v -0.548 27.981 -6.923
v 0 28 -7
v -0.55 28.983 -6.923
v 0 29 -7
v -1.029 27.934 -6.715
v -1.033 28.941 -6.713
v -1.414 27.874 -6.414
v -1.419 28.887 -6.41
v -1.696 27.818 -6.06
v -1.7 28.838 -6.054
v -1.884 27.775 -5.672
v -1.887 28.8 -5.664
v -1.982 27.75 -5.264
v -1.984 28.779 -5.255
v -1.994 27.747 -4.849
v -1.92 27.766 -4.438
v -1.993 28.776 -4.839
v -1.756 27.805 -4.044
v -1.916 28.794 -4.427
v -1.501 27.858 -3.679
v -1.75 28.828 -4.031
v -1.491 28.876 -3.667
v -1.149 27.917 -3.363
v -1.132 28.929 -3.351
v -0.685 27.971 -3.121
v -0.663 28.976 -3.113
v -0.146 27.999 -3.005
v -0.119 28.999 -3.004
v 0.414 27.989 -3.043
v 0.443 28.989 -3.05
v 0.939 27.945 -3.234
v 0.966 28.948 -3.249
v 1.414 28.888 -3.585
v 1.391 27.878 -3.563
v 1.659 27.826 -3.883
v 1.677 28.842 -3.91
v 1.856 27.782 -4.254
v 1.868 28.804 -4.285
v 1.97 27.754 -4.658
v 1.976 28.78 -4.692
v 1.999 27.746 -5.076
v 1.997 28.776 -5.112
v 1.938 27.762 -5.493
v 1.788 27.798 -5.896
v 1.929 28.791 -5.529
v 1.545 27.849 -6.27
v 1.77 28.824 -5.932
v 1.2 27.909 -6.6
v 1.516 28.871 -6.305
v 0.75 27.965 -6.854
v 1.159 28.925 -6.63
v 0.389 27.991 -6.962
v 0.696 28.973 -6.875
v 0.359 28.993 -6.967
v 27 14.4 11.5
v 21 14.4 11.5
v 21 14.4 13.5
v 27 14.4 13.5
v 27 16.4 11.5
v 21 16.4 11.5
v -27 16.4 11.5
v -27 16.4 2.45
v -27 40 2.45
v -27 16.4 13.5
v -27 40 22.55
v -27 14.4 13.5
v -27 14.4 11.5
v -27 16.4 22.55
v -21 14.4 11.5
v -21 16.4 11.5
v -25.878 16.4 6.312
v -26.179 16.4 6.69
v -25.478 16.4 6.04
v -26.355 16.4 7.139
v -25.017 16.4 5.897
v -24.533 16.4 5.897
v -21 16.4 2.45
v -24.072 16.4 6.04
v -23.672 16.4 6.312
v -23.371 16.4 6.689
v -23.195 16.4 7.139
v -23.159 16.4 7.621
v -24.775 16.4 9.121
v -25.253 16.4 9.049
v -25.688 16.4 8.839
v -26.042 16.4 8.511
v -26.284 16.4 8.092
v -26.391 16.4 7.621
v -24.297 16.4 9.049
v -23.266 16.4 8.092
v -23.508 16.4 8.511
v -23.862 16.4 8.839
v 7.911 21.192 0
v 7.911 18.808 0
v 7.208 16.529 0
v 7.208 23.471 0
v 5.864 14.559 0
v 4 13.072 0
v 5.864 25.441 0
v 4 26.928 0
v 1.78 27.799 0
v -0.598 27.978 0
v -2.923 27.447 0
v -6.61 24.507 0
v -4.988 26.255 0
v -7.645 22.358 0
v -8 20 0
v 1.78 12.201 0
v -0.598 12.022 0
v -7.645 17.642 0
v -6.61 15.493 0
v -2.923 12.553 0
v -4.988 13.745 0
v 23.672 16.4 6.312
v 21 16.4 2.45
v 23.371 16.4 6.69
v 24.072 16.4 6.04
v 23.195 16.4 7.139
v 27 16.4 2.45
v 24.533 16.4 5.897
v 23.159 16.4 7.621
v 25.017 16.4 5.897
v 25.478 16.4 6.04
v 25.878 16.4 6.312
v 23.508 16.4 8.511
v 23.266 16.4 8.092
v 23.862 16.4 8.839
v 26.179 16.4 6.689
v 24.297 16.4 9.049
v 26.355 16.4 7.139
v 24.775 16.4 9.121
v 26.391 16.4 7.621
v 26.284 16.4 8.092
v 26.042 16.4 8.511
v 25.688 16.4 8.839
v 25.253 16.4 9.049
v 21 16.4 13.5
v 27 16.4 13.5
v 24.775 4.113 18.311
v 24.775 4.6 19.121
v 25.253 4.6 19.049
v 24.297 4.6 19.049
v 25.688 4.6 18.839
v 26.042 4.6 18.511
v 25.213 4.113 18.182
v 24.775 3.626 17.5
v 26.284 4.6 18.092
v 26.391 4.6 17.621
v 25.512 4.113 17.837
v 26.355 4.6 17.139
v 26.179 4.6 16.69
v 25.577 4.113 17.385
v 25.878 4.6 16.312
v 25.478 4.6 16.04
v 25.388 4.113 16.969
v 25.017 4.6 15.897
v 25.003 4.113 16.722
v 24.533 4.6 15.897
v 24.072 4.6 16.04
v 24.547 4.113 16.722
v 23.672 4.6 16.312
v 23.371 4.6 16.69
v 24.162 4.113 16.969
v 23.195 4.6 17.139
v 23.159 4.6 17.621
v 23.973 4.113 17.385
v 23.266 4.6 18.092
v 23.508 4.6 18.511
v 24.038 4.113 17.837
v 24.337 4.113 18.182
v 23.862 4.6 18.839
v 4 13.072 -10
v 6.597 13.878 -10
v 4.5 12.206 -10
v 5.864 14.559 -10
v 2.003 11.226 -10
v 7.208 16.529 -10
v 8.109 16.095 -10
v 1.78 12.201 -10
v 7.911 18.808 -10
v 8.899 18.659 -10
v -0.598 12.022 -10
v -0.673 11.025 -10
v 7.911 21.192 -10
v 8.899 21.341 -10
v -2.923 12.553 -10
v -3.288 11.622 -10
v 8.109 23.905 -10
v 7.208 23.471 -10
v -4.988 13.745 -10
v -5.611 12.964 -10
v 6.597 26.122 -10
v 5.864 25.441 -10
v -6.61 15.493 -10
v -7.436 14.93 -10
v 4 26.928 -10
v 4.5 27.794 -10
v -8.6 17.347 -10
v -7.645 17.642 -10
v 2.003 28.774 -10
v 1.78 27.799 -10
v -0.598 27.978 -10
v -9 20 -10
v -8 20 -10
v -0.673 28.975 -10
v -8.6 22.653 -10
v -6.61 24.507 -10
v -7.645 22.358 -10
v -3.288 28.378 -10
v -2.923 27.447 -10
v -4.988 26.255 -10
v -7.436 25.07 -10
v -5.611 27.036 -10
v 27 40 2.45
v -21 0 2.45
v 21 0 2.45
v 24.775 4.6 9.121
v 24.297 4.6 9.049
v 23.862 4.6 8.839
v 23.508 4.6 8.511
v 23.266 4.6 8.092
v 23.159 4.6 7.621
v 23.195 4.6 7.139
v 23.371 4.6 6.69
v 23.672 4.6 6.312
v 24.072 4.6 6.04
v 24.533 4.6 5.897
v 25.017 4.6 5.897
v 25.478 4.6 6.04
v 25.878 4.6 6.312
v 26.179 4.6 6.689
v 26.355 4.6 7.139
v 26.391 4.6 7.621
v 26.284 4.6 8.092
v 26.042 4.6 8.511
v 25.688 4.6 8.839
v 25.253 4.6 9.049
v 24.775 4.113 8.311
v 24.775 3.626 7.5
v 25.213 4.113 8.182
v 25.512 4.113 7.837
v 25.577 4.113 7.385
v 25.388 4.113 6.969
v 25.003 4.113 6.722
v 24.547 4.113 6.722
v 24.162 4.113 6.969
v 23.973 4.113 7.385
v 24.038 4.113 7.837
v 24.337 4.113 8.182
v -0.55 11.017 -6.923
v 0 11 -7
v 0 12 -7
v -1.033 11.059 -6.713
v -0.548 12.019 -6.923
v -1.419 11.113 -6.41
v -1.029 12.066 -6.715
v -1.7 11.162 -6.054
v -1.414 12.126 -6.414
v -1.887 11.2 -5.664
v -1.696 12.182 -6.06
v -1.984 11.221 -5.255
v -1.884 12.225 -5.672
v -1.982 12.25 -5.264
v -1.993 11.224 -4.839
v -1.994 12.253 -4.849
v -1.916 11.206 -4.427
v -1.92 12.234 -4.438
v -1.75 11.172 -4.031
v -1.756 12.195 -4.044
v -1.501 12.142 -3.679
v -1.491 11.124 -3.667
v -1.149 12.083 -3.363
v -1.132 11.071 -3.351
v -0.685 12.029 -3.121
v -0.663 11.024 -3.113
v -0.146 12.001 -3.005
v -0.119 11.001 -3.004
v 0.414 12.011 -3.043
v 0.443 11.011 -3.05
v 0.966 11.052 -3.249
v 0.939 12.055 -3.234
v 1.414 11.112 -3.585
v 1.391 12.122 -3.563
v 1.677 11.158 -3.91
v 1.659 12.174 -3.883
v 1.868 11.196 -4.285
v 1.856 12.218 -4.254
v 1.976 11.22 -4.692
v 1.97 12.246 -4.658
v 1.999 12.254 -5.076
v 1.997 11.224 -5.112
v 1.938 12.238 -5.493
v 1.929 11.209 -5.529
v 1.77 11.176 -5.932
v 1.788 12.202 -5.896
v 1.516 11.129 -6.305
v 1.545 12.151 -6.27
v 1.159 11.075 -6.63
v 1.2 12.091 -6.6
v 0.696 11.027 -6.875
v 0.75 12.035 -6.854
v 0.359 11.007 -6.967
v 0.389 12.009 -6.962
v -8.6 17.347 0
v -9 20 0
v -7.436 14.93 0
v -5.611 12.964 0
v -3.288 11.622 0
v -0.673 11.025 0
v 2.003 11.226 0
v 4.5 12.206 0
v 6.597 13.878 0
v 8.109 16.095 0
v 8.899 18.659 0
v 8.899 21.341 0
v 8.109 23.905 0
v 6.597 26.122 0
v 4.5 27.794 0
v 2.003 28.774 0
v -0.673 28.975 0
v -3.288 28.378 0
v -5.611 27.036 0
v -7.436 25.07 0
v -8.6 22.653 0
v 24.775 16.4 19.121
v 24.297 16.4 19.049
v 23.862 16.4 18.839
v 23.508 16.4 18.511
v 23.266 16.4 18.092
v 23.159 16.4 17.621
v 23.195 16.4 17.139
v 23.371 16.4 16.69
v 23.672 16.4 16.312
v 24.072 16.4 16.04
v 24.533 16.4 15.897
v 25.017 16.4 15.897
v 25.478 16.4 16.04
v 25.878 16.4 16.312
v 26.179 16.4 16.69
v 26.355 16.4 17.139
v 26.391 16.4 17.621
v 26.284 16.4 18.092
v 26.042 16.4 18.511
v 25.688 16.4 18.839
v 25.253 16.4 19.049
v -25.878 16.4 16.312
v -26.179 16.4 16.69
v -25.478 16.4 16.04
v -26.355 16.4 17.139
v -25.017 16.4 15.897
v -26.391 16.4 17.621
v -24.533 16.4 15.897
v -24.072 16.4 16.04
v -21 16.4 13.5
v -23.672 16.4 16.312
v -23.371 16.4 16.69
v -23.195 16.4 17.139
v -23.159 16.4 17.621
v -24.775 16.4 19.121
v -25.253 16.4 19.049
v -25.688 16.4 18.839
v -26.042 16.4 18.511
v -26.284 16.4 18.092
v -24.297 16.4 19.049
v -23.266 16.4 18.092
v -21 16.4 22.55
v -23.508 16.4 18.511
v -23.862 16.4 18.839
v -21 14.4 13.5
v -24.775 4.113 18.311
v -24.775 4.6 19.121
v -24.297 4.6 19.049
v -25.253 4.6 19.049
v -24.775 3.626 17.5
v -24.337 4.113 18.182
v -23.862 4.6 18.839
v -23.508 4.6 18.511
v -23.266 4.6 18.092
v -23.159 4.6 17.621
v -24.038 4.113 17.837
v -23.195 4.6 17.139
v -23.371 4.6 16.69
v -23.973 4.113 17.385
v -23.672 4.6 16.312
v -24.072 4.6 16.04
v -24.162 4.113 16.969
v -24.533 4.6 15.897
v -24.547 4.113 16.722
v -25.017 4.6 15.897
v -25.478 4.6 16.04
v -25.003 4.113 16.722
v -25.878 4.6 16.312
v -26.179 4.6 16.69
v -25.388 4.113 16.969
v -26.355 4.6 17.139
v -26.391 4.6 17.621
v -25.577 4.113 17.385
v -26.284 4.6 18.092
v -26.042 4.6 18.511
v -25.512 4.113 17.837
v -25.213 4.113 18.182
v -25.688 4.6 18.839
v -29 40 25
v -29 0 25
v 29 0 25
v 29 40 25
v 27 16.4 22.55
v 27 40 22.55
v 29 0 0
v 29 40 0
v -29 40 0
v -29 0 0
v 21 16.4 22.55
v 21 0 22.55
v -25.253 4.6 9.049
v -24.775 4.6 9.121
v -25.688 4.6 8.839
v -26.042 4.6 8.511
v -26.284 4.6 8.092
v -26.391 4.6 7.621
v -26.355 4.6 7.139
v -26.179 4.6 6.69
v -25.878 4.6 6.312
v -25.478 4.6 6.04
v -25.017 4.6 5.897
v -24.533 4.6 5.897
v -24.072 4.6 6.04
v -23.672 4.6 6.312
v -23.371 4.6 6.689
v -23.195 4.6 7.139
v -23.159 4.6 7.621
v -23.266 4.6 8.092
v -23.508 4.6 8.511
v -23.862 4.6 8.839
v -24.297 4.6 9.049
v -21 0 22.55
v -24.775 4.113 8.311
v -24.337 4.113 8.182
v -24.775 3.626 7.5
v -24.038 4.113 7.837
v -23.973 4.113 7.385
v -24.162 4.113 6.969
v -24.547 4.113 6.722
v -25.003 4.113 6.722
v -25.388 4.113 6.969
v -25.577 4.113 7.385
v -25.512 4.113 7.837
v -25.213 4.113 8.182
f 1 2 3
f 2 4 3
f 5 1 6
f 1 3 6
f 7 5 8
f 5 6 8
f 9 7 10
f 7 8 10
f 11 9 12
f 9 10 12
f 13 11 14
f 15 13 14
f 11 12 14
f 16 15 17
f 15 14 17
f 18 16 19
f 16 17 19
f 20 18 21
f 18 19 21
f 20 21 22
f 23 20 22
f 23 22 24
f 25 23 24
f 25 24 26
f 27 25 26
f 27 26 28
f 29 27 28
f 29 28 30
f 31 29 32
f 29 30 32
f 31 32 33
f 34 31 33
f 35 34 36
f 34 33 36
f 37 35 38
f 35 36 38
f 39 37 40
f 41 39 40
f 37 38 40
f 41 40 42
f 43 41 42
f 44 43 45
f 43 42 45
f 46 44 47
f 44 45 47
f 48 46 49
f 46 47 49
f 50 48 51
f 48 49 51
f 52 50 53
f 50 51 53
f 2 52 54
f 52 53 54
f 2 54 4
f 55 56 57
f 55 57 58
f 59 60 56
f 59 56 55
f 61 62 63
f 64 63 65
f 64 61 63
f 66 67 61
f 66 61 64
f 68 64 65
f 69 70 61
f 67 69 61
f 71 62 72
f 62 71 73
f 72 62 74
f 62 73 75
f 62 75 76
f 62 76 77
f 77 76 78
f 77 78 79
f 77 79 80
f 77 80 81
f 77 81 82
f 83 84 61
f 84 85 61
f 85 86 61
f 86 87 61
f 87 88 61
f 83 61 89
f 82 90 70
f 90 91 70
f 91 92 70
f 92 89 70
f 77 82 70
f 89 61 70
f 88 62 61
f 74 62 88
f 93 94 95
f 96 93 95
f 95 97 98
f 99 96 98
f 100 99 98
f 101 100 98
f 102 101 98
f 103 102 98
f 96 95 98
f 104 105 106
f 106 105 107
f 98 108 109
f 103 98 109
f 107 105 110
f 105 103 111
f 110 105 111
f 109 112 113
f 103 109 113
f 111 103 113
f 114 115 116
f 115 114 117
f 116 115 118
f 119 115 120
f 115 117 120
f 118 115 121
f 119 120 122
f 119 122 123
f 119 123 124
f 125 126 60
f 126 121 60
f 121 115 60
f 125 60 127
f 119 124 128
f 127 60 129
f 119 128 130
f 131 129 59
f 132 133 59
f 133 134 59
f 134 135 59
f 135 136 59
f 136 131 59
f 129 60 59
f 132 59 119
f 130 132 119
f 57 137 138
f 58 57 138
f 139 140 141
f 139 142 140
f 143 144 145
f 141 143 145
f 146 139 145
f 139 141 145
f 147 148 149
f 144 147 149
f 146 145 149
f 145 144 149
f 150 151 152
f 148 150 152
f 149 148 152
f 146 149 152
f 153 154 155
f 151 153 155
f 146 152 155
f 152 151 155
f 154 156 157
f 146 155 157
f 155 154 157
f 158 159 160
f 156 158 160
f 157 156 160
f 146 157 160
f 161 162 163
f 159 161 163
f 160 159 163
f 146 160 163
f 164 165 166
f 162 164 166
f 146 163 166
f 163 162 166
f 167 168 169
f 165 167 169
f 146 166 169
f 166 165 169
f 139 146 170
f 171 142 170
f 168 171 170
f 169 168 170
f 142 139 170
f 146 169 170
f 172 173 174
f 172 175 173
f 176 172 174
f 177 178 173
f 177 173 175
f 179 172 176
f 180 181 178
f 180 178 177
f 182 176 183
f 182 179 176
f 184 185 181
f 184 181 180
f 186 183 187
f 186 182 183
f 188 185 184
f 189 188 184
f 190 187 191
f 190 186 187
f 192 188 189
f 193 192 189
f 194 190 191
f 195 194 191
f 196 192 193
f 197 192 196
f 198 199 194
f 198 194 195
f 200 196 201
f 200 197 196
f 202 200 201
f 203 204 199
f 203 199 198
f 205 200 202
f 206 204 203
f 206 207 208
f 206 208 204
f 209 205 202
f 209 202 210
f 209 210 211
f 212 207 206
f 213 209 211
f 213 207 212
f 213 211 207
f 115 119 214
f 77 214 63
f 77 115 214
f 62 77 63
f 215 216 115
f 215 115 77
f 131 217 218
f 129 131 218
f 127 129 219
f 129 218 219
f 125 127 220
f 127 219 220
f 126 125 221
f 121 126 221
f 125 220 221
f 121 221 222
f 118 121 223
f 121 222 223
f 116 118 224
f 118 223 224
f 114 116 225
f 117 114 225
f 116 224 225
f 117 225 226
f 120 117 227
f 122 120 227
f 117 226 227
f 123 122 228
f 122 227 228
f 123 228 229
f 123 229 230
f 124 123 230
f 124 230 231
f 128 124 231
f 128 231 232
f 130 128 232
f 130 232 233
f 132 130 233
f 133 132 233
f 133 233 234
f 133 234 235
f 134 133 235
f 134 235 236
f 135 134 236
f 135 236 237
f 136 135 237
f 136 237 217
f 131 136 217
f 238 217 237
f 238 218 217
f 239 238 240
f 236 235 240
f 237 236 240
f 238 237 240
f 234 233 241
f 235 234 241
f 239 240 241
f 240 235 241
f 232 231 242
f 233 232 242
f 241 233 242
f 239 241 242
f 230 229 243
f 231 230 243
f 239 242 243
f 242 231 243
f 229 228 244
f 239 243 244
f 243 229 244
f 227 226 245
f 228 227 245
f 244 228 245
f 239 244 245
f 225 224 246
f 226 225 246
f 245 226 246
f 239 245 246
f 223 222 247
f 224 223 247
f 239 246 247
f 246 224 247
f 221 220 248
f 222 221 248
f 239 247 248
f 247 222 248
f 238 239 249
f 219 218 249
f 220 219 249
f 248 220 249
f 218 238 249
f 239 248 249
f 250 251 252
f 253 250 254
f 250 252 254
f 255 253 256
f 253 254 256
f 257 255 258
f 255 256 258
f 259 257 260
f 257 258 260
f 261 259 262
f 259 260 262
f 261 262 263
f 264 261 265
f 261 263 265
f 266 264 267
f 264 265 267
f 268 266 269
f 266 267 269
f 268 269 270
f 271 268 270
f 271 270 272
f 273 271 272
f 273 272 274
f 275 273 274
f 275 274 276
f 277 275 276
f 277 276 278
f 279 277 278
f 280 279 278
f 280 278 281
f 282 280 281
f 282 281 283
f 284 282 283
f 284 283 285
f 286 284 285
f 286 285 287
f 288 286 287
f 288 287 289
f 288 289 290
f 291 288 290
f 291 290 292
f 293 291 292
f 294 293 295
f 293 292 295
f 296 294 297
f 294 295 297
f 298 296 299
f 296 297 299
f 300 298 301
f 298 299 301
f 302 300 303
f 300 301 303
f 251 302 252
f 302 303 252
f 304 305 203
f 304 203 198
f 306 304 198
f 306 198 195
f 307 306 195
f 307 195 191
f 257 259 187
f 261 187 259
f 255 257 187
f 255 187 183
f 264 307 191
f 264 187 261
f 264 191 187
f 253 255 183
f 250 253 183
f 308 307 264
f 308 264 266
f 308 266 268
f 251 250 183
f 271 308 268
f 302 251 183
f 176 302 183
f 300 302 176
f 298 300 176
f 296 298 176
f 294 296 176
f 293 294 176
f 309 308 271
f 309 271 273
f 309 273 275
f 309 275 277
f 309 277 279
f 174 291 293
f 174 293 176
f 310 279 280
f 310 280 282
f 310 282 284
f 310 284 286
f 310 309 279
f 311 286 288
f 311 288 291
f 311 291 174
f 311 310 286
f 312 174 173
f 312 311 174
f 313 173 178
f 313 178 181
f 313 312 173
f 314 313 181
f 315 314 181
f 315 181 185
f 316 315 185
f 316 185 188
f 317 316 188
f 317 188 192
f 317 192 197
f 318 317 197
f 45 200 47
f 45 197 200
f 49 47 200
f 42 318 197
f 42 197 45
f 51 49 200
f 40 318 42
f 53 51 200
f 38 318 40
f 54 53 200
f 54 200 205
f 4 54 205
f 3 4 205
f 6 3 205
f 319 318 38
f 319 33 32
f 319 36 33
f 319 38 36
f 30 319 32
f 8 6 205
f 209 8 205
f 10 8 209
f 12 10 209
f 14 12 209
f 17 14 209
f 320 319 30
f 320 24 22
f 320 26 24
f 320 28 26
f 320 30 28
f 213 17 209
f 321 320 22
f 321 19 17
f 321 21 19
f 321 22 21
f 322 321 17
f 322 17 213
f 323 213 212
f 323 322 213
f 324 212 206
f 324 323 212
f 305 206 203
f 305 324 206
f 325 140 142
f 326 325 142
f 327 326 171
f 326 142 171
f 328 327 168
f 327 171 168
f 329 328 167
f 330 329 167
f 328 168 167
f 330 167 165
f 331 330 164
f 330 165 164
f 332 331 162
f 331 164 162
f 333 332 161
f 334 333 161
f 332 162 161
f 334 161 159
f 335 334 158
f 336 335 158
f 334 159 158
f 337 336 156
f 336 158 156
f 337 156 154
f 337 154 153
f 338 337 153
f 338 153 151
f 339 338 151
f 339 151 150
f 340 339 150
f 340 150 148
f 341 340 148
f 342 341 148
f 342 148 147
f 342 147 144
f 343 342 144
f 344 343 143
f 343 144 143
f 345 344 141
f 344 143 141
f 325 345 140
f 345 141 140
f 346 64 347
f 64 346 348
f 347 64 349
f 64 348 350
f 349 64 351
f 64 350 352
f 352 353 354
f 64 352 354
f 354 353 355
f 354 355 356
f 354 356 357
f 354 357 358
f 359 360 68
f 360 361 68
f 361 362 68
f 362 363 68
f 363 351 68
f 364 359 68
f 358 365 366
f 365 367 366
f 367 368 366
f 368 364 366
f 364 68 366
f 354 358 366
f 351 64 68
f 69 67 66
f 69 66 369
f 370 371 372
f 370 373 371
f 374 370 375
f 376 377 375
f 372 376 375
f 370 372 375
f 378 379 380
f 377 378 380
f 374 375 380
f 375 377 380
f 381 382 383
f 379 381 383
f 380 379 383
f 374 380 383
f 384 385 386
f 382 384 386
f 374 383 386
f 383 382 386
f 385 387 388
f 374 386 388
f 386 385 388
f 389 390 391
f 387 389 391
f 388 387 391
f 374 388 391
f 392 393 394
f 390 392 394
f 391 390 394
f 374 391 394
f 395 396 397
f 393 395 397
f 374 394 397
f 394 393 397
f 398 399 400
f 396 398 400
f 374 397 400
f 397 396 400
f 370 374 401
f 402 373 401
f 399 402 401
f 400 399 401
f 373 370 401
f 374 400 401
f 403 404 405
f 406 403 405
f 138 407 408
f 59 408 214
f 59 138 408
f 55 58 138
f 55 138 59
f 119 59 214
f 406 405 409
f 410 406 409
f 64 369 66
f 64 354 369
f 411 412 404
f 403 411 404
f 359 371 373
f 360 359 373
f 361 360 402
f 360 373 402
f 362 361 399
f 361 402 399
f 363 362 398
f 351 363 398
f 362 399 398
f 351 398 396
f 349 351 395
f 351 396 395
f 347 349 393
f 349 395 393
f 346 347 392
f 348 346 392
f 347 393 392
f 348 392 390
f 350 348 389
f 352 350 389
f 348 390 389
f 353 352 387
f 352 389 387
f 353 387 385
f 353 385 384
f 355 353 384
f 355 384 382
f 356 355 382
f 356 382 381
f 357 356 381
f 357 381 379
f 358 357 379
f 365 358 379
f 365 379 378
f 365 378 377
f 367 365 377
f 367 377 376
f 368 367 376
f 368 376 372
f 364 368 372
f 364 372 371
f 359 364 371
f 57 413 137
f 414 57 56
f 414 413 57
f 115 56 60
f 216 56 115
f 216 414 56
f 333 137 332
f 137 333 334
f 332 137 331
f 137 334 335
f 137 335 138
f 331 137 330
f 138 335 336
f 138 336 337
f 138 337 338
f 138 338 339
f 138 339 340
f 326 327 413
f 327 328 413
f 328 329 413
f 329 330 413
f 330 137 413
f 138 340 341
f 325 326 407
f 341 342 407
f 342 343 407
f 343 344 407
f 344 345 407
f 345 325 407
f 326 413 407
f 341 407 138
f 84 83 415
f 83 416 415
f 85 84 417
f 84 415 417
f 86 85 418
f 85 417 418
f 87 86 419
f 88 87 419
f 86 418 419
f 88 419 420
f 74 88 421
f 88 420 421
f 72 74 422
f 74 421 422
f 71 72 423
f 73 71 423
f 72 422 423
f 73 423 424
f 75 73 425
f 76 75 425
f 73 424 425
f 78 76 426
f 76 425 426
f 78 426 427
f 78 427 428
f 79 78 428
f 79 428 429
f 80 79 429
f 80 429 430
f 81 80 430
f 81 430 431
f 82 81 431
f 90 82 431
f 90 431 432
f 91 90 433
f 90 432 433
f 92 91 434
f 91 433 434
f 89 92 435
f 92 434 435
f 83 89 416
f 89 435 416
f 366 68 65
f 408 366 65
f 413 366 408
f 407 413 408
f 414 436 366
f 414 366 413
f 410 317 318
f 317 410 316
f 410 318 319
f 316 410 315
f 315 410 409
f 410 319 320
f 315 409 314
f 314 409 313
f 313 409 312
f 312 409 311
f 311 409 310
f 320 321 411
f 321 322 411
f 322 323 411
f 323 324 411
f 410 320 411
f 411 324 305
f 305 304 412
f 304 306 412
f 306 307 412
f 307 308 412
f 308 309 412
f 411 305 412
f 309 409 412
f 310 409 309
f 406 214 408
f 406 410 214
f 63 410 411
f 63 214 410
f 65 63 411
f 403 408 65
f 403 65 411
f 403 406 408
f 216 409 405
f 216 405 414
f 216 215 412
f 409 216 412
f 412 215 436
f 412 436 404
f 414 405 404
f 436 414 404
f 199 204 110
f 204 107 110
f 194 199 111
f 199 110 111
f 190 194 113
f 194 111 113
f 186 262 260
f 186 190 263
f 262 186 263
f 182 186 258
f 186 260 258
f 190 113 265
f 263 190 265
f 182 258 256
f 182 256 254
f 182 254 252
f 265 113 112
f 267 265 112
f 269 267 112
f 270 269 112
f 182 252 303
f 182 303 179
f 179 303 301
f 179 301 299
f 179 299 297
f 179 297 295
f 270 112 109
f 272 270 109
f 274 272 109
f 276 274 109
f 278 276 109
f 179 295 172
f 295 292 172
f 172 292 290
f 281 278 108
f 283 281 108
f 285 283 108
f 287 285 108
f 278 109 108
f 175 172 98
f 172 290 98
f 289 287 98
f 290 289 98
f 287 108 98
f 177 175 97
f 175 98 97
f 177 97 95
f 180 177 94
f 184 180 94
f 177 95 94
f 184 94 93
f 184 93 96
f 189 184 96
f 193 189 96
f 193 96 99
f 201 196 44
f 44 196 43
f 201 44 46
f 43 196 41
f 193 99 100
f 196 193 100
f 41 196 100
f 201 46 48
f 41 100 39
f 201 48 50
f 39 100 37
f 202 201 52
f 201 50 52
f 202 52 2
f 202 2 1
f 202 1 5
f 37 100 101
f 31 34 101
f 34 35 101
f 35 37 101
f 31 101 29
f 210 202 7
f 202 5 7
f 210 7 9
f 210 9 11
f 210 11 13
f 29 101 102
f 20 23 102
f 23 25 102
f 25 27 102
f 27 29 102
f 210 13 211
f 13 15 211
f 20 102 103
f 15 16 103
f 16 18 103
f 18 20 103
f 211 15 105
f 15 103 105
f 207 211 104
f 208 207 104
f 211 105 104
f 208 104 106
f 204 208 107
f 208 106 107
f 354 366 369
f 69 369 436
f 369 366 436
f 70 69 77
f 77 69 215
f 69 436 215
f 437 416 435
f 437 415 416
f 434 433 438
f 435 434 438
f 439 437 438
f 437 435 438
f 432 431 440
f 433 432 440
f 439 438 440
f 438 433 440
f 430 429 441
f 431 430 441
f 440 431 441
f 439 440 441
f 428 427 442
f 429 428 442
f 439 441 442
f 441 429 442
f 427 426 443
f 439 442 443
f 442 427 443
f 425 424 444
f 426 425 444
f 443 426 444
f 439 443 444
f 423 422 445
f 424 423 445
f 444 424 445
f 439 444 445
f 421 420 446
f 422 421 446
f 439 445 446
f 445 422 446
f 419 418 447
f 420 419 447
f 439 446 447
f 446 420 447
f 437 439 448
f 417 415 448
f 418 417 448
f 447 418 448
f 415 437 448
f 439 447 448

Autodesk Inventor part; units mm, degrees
ref_plane "YZ Plane" through (0, 0, 0) normal (1, 0, 0) x (0, 1, 0)
ref_plane "XZ Plane" through (0, 0, 0) normal (0, 1, 0) x (-1, 0, 0)
ref_plane "XY Plane" through (0, 0, 0) normal (0, 0, 1) x (1, 0, 0)
sketch "Esquisse1" plane through (0, 0, 0) normal (0, 1, 0) x (-1, 0, 0)
  line L0 (0, 0) -> (0, 2.45)
  line L1 (0, 0) -> (2.45, 0) construction
  line L2 (0, 2.45) -> (27, 2.45)
  line L3 (27, 2.45) -> (27, 22.55)
  line L4 (27, 22.55) -> (-27, 22.55)
  line L5 (-27, 22.55) -> (-27, 2.45)
  line L6 (-27, 2.45) -> (0, 2.45)
  line L7 (0, 0) -> (29, 0)
  line L8 (29, 0) -> (29, 25)
  line L9 (29, 25) -> (-29, 25)
  line L10 (-29, 25) -> (-29, 0)
  line L11 (-29, 0) -> (0, 0)
  dimension "d0" = 2.45
  dimension "d1" = 90
  dimension "d2" = 27
  dimension "d3" = 20.1
  dimension "d4" = 54
  dimension "d5" = 29
  dimension "d6" = 25
  dimension "d7" = 58
extrude "Extrusion1" add sketch "Esquisse1" along normal blind 40
sketch "Esquisse2" plane through (29, 0, 0) normal (0, 0, -1) x (-1, 0, 0)
  line L0 (29, 0) -> (29, 40)
  line L1 (58, 40) -> (0, 40) projected
  line L2 (0, 0) -> (0, 40) projected
  line L3 (0, 20) -> (58, 20)
  line L4 (58, 0) -> (58, 40) projected
  circle A0 centre (29, 20) radius 8
  circle A1 centre (29, 20) radius 9
  dimension "d10" = 16
  dimension "d11" = 18
extrude "Extrusion2" add sketch "Esquisse2" along normal blind 10 contours A1 L3 A0 L0 | L0 A0 L3 A1 | A1 L0 A0 L3 | L3 A0 L0 A1
sketch "Esquisse3" plane through (0, 0, 0) normal (0, 1, 0) x (-1, 0, 0)
  line L0 (-9, -10) -> (9, -10) projected
  line L1 (0, -10) -> (0, -5)
  point P0 (0, 0)
  dimension "d14" = 5
hole "Perçage1" at (0, 0, -5) direction (0, 1, 0) diameter 4 end through all
sketch "Esquisse4" plane through (0, 0, 0) normal (0, -1, 0) x (1, 0, 0)
  line L0 (27, 2.45) -> (27, 22.55) projected
  line L1 (27, 22.55) -> (-27, 22.55) projected
  line L2 (-27, 2.45) -> (27, 2.45) projected
  line L3 (-27, 22.55) -> (-27, 2.45) projected
  line L4 (27, 22.55) -> (21, 22.55)
  line L5 (27, 22.55) -> (33, 22.55) construction
  line L6 (21, 22.55) -> (21, 2.45)
  line L7 (-27, 22.55) -> (-21, 22.55)
  line L8 (-21, 22.55) -> (-21, 2.45)
  point P0 (0, 0)
  dimension "d22" = 6
  dimension "d23" = 180
  dimension "d24" = 6
extrude "Extrusion3" add sketch "Esquisse4" against normal blind 16.4 contours L2 L6 L1 L0 | L2 L3 L1 L8
sketch "Esquisse5" plane through (0, 16.4, 0) normal (0, 1, 0) x (1, 0, 0)
  line L0 (-21, -22.55) -> (-21, -2.45) projected
  line L1 (-21, -22.55) -> (-21, -12.5)
  line L2 (-21, -12.5) -> (-21, -11.5)
  line L3 (-27, -22.55) -> (-27, -2.45) projected
  line L4 (-21, -11.5) -> (-27, -11.5)
  line L5 (-21, -12.5) -> (-21, -13.5)
  line L6 (-21, -13.5) -> (-27, -13.5)
  line L7 (0, -14.9752) -> (0, -10.0185)
  line L8 (21, -22.55) -> (21, -2.45)
  line L9 (27, -22.55) -> (27, -2.45)
  line L10 (21, -11.5) -> (27, -11.5)
  line L11 (21, -13.5) -> (27, -13.5)
  point P0 (0, 0)
  dimension "d27" = 10.05
  dimension "d28" = 1
  dimension "d29" = 1
extrude "Extrusion4" cut sketch "Esquisse5" against normal blind 2
sketch "Esquisse6" plane through (0, 16.4, 0) normal (0, 1, 0) x (1, 0, 0)
  line L0 (-27, -22.55) -> (-27, -2.45) projected
  line L1 (-21, -22.55) -> (-21, -13.5) projected
  line L2 (-21, -11.5) -> (-21, -2.45) projected
  line L3 (-27, -12.5) -> (-27, -17.5)
  line L4 (-27, -17.5) -> (-24.775, -17.5)
  line L5 (-24.775, -17.5) -> (-24.775, -7.5)
  line L6 (0, -16.5029) -> (0, -8.8773)
  point P0 (0, 0)
  point P1 (24.775, -17.5)
  point P2 (24.775, -7.5)
  dimension "d32" = 5
  dimension "d33" = 2.225
  dimension "d34" = 10
hole "Perçage2" at (-24.775, 16.4, 17.5) at (-24.775, 16.4, 7.5) at (24.775, 16.4, 17.5) at (24.775, 16.4, 7.5) direction (0, -1, 0) diameter 3.242 depth 11.8 tip angle 118 thread size "M4x0.7" class "6H" standard "ISO Metric profile"
properties part number "Attache servomoteur_bogie"
